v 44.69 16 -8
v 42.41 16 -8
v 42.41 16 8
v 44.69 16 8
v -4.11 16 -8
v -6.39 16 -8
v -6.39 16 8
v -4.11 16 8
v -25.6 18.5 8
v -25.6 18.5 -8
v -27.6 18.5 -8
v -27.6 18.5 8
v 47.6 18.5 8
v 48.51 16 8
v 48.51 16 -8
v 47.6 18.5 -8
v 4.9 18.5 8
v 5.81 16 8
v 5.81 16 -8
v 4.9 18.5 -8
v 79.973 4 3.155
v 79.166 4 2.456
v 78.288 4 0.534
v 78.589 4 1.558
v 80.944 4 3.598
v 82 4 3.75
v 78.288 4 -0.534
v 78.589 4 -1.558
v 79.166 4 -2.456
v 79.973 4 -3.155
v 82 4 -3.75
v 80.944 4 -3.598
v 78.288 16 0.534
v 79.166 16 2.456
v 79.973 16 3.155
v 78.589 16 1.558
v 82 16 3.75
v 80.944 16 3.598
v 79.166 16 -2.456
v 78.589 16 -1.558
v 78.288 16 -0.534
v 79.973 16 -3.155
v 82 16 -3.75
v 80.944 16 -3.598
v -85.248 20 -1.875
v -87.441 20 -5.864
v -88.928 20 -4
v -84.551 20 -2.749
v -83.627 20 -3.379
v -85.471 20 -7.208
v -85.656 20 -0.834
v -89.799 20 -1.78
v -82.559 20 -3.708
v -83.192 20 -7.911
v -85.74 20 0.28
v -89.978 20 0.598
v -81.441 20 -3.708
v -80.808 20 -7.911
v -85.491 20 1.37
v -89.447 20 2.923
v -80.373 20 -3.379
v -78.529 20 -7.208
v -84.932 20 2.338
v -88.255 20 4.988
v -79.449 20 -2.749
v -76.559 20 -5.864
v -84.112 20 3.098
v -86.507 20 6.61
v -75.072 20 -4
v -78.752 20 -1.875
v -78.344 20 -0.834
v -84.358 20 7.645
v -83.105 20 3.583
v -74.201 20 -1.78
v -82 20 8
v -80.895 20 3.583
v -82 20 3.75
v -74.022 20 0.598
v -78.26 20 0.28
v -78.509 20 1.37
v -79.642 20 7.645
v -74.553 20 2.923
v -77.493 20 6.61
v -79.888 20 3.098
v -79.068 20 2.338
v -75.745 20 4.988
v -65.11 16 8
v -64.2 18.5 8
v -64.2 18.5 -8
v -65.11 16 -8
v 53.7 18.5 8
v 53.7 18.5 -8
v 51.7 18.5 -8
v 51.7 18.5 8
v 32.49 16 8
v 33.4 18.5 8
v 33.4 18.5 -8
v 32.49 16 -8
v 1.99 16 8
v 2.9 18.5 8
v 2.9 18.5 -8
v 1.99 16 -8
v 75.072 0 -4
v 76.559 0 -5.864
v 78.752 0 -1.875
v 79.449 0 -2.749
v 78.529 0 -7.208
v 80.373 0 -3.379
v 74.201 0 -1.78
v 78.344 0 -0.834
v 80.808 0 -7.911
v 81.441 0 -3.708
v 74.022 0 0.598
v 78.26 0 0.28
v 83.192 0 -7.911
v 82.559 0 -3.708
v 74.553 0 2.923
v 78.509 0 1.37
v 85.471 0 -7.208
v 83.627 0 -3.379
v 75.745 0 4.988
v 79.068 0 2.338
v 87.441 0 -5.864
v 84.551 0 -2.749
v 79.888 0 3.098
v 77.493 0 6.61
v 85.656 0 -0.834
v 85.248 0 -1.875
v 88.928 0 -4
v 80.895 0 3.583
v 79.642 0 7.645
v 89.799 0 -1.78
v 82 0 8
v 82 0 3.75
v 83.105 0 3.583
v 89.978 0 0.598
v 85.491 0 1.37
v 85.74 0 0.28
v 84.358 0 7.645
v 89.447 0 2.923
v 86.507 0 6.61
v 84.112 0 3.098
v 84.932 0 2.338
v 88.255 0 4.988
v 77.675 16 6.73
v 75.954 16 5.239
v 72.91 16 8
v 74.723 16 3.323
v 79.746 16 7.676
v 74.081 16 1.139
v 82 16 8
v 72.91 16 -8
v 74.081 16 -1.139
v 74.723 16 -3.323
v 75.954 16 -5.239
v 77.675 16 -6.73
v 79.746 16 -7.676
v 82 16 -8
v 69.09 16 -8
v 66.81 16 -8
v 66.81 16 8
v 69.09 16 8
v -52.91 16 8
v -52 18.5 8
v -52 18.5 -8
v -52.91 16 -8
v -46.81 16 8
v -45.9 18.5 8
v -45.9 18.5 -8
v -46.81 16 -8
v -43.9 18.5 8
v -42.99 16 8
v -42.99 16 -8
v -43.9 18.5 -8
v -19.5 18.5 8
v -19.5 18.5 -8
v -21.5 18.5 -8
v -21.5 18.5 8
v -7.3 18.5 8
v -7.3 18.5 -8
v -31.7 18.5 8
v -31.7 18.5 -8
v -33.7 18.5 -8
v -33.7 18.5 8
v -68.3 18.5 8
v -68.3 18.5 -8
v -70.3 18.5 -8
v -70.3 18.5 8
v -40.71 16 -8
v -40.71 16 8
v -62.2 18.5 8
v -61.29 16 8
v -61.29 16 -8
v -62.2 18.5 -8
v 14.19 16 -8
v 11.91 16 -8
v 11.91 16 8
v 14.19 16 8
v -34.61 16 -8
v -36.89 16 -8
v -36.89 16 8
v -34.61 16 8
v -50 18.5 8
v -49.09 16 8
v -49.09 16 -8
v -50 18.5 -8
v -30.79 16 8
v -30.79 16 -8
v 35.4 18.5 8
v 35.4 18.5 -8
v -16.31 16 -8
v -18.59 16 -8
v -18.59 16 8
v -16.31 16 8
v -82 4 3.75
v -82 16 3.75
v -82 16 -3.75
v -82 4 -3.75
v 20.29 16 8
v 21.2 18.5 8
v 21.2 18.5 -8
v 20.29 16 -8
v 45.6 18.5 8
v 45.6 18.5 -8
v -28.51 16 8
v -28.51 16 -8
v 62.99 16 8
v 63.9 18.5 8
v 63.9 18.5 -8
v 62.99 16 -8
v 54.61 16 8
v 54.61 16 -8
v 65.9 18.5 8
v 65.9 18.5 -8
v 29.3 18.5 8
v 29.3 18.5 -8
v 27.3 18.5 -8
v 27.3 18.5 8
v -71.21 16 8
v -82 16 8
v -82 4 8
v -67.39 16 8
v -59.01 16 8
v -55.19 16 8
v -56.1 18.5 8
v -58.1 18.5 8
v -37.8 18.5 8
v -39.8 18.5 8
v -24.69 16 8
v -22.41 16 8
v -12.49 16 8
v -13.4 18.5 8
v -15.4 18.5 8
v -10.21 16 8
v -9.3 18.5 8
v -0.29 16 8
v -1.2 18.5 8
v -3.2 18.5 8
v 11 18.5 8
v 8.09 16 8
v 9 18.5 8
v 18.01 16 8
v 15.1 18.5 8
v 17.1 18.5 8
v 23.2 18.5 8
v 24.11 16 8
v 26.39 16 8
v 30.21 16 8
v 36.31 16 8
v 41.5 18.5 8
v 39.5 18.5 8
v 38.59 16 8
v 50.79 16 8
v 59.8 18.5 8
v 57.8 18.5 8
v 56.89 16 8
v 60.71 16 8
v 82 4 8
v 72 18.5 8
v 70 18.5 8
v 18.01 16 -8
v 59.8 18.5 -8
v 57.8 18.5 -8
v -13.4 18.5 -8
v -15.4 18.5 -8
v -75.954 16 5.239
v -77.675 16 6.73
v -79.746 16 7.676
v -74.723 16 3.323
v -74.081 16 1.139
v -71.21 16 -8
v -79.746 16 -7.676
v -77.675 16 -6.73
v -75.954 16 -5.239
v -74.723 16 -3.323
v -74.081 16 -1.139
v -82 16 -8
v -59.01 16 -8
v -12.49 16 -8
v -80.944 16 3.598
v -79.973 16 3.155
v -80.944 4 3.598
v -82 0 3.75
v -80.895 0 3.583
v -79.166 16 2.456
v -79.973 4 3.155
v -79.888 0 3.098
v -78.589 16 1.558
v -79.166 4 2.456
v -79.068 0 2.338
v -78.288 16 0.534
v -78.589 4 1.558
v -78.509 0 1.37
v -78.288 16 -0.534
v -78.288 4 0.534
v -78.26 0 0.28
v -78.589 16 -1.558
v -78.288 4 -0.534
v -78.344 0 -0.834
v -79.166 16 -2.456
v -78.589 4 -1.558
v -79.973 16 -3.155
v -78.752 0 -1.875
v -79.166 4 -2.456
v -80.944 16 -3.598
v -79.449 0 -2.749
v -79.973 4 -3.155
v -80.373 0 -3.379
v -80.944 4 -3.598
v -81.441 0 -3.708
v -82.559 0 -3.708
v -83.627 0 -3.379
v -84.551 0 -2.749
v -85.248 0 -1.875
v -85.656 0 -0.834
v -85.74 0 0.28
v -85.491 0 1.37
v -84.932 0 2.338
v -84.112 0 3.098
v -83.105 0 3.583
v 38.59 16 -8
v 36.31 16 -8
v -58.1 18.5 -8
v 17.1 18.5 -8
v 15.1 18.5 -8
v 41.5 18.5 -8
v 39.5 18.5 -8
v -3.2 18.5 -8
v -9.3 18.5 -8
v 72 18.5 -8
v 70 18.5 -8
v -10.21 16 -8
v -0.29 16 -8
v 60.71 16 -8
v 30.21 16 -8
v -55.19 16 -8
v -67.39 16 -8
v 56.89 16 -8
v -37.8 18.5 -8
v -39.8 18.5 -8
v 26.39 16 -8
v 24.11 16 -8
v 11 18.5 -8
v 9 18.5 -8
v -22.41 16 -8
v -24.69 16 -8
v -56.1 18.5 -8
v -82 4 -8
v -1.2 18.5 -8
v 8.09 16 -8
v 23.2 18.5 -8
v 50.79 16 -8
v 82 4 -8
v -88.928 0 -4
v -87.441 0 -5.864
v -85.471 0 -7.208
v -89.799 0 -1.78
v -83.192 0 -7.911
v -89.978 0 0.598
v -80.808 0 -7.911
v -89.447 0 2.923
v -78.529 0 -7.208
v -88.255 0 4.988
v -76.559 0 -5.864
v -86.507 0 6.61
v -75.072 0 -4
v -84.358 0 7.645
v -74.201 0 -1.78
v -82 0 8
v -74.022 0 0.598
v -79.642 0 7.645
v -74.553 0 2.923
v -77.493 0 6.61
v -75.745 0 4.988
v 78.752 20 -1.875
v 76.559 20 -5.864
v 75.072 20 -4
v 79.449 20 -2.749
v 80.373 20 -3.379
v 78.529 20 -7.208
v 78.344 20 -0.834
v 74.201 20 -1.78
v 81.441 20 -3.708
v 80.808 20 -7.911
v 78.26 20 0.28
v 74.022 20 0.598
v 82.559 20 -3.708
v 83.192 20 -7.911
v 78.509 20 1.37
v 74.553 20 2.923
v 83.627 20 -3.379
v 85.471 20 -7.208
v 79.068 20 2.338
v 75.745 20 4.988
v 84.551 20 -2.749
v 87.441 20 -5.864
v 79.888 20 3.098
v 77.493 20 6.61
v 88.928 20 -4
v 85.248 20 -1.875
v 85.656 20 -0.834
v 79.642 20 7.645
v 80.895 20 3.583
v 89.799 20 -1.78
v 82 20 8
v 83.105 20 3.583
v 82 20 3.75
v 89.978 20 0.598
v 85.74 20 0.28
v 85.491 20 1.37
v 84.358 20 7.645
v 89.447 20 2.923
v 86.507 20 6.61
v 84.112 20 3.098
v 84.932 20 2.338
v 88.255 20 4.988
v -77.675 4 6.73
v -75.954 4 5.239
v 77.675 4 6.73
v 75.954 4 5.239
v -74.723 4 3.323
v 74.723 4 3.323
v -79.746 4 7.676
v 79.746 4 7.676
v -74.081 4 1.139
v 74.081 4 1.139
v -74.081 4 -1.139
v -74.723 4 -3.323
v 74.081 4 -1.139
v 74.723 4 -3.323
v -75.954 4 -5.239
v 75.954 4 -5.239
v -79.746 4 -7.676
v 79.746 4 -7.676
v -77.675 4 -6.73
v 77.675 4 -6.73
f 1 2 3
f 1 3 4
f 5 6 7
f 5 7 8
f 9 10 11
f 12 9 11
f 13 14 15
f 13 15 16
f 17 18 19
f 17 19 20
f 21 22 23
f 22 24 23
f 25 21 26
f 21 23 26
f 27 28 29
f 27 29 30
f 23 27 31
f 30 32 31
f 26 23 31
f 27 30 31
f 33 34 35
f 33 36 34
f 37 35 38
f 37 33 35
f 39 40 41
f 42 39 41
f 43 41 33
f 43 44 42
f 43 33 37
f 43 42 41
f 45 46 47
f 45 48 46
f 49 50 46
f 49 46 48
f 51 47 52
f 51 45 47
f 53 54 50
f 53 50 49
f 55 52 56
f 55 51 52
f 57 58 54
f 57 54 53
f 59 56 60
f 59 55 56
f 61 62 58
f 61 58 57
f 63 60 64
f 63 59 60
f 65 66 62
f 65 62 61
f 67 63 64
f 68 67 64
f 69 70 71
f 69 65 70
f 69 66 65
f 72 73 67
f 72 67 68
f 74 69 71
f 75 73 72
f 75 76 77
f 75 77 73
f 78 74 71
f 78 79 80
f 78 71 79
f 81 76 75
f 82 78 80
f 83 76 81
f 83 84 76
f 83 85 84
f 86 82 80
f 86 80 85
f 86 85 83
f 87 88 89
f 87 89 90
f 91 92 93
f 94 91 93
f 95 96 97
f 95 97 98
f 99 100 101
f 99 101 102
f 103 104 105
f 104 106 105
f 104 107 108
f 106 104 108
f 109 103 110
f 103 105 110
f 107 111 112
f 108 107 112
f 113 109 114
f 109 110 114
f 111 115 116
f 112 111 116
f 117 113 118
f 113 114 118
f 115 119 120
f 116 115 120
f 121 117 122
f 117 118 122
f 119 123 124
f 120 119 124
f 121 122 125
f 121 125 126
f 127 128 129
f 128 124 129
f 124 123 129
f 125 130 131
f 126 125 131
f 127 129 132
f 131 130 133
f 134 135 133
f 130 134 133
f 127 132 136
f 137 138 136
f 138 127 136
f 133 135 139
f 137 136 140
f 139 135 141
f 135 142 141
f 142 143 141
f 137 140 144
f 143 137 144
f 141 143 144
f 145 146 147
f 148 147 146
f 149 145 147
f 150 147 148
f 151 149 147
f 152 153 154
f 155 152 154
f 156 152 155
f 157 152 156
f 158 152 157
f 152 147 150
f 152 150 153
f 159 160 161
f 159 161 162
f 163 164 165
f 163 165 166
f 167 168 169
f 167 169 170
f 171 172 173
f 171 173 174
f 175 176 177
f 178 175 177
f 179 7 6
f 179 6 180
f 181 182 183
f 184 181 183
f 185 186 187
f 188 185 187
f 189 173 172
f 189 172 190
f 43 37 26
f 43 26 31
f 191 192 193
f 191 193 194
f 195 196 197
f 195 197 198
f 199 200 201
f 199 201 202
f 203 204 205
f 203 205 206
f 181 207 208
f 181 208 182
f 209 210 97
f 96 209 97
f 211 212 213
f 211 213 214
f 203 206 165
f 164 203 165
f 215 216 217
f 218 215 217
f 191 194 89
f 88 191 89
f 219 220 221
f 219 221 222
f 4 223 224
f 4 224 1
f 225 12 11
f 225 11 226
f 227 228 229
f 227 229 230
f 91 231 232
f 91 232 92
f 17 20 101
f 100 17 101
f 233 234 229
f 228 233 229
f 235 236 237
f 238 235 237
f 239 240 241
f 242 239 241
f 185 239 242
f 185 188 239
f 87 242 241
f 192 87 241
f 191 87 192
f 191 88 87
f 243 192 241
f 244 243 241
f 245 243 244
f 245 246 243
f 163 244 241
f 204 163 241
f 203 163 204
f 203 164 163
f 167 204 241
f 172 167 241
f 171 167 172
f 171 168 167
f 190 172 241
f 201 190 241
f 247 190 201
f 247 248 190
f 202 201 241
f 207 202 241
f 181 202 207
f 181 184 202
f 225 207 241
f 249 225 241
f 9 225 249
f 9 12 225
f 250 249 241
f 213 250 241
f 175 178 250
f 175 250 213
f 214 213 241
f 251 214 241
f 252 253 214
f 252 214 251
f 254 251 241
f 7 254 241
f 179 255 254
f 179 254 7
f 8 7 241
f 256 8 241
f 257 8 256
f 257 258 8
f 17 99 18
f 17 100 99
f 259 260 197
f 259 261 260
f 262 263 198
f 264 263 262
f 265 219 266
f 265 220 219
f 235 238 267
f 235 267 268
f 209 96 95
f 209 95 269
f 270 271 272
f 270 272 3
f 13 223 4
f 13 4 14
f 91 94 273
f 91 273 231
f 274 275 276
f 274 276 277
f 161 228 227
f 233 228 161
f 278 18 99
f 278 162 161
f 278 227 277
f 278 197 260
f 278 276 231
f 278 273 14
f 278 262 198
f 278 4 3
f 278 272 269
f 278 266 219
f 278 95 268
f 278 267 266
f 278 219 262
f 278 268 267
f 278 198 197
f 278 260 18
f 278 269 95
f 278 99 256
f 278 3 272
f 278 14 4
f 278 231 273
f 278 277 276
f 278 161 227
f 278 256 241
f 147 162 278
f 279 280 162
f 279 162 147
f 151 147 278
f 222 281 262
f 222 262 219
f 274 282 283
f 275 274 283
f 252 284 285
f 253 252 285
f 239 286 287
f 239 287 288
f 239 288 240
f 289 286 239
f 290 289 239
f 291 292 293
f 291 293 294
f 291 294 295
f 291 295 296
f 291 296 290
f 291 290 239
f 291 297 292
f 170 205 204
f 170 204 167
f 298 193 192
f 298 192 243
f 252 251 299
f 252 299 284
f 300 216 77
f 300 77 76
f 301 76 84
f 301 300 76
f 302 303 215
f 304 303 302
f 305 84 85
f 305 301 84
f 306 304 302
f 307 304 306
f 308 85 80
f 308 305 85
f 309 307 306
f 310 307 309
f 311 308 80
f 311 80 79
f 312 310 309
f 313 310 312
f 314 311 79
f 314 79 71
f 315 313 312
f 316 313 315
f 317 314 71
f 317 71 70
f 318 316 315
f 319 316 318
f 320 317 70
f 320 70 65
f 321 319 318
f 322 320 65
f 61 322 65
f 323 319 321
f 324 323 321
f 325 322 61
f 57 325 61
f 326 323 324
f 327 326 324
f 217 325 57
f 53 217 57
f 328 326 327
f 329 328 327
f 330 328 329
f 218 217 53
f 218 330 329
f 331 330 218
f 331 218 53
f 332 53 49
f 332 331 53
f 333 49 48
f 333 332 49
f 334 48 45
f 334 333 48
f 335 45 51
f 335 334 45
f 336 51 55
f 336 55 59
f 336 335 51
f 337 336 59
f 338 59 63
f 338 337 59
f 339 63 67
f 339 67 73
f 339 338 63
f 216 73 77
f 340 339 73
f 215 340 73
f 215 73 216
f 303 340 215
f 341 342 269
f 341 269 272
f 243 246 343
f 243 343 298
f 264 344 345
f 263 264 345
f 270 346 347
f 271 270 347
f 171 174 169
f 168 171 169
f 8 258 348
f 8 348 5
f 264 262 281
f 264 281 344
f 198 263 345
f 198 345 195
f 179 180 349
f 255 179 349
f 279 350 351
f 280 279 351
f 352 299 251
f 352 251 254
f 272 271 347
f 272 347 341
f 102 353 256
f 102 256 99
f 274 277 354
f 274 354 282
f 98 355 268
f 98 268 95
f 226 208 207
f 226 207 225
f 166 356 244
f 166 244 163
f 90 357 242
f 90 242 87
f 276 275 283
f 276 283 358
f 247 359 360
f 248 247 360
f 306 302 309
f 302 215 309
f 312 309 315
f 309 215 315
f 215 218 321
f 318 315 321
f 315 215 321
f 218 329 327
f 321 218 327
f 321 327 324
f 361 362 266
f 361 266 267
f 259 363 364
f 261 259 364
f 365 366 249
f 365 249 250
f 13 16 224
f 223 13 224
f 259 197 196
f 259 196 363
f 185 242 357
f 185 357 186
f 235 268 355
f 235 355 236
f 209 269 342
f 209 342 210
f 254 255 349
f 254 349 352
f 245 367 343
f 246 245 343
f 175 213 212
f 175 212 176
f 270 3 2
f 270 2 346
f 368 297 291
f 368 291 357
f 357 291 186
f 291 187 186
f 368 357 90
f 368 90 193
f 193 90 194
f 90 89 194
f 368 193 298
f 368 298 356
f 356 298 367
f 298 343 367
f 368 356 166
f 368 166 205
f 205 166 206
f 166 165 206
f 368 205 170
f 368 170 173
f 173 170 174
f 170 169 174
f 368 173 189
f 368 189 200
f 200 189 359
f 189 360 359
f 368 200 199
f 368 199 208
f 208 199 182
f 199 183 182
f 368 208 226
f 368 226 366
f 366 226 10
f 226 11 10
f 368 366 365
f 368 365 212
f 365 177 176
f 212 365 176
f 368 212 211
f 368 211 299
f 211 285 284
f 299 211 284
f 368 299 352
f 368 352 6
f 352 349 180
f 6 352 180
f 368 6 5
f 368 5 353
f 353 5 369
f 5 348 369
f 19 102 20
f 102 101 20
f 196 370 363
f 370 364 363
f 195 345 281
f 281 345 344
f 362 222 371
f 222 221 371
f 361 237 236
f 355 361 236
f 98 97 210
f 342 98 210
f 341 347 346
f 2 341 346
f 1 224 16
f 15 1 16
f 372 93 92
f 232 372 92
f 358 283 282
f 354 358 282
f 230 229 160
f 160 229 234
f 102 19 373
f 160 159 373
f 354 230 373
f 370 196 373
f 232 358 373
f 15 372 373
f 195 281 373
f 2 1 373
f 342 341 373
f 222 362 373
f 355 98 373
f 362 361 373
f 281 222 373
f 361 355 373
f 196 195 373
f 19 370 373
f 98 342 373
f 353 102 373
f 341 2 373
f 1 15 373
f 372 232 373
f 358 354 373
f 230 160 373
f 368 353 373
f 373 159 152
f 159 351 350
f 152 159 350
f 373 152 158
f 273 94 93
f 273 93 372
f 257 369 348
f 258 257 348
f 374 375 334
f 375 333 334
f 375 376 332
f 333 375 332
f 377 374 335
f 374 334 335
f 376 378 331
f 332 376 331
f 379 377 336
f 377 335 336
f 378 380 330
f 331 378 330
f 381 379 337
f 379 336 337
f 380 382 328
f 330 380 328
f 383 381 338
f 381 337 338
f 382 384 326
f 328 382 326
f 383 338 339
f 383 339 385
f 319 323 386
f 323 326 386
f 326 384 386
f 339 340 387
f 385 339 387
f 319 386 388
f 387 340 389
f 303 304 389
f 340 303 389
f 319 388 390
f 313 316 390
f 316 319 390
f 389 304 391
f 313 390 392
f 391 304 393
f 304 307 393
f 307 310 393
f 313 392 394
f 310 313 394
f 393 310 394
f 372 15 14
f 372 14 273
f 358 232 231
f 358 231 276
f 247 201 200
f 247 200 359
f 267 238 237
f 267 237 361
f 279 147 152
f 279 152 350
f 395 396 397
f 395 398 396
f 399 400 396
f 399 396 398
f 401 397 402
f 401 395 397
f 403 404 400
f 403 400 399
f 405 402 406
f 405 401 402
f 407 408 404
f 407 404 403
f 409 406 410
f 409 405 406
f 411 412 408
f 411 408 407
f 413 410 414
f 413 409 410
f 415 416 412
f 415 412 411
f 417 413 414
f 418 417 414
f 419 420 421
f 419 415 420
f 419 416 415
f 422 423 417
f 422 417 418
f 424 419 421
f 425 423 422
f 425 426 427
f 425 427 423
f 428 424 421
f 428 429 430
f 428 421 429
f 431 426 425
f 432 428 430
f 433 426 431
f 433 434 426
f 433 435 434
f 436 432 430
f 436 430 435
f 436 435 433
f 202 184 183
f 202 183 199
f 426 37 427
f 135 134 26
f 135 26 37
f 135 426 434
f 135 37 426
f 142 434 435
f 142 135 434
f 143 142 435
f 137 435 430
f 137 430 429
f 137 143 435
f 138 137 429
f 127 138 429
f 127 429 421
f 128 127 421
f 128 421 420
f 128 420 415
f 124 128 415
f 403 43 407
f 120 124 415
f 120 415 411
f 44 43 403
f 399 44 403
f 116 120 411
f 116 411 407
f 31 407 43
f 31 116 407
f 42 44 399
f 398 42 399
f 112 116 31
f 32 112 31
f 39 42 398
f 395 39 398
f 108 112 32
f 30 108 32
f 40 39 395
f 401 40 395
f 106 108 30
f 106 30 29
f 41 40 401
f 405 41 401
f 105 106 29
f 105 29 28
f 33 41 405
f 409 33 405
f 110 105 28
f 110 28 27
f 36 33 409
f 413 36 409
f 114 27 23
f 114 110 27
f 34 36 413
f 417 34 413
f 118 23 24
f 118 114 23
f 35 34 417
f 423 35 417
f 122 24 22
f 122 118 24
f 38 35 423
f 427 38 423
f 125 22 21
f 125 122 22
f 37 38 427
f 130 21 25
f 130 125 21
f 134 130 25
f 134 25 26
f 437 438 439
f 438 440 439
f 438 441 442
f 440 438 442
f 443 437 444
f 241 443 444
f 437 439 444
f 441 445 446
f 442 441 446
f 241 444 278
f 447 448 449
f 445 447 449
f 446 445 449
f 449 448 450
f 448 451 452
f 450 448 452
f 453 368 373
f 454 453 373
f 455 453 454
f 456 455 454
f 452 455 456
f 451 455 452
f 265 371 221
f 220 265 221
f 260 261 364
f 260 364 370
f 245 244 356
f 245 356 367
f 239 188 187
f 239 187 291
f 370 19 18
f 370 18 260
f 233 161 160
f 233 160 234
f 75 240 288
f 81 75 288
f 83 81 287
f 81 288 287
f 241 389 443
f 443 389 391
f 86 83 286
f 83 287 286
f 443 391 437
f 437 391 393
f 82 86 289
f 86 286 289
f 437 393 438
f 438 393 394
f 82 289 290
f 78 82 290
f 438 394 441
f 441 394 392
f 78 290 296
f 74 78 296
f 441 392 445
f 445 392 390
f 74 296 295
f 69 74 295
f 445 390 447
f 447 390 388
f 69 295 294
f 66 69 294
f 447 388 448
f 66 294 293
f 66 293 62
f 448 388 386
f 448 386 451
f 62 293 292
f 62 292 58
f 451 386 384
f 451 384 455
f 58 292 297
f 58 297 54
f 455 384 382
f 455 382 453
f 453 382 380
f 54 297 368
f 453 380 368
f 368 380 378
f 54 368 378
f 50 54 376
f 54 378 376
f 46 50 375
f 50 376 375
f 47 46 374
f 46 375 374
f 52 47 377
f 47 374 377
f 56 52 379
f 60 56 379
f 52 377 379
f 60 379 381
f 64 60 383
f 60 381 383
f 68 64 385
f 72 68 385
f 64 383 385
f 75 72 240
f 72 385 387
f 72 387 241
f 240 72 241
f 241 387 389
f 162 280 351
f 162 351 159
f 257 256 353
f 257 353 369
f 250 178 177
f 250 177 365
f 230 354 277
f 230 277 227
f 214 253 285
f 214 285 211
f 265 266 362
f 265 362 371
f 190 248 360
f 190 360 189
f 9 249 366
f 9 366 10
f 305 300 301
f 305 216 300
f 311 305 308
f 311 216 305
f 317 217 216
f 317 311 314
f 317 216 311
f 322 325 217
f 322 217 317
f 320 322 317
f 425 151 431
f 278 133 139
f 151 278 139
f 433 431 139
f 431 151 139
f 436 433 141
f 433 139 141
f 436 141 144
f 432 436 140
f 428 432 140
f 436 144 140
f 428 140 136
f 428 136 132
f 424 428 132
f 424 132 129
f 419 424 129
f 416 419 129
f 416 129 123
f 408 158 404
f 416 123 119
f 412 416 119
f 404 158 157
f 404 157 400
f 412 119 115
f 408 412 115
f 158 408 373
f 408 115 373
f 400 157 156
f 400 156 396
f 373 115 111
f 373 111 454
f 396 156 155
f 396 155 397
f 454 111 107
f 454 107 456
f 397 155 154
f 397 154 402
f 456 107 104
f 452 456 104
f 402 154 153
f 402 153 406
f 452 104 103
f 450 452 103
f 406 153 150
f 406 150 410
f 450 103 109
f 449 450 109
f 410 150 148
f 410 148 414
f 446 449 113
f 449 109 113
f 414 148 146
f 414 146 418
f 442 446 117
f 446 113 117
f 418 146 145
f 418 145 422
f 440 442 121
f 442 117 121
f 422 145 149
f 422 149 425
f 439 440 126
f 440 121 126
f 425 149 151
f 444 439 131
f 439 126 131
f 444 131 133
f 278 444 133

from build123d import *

# Parameters (mm, degrees)
SKETCH2_R             = 8
SKETCH2_R_2           = 3.75
BOSS_EXTRUDE1_DEPTH   = 20
BOSS_EXTRUDE1_2_DEPTH = 20
SKETCH4_W             = 164
SKETCH4_H             = 16
BOSS_EXTRUDE2_DEPTH   = 12
BOSS_EXTRUDE3_DEPTH   = 16
LPATTERN2_COUNT       = 24
LPATTERN2_PITCH       = 6.1


with BuildPart() as part:
    # Sketch2 → Boss-Extrude1 (new body)
    with BuildSketch(Plane(origin=(0, 0, 0), x_dir=(1, 0, 0), z_dir=(0, 1, 0))):
        with Locations(Location((-82, 0, 0), (0, 0, 270))):
            Circle(SKETCH2_R)
        with Locations(Location((-82, 0, 0), (0, 0, 270))):
            Circle(SKETCH2_R_2, mode=Mode.SUBTRACT)
    extrude(amount=BOSS_EXTRUDE1_DEPTH)



with BuildPart() as body_2:
    # Sketch2 → Boss-Extrude1 2 (new body)
    with BuildSketch(Plane(origin=(0, 0, 0), x_dir=(1, 0, 0), z_dir=(0, 1, 0))):
        with Locations(Location((82, 0, 0), (0, 0, 270))):
            Circle(SKETCH2_R)
        with Locations(Location((82, 0, 0), (0, 0, 270))):
            Circle(SKETCH2_R_2, mode=Mode.SUBTRACT)
    extrude(amount=BOSS_EXTRUDE1_2_DEPTH)


with BuildPart() as part_1:
    add(part.part)

    add(body_2.part)  # Boss-Extrude2 merges body 2
    # Sketch4 → Boss-Extrude2 (add)
    with BuildSketch(Plane(origin=(0, 16, 0), x_dir=(1, 0, 0), z_dir=(0, 1, 0))):
        Rectangle(SKETCH4_W, SKETCH4_H)
    extrude(amount=-BOSS_EXTRUDE2_DEPTH)

    # Sketch5 → Boss-Extrude3 (add, through all)
    with BuildSketch(Plane.XY.offset(8)):
        Polygon((72.909925586, 16), (72, 18.5), (70, 18.5), (69.090074414, 16), align=None)
    boss_extrude3 = extrude(amount=-BOSS_EXTRUDE3_DEPTH)

    # LPattern2: Boss-Extrude3 ×24
    with Locations(*[(-i * LPATTERN2_PITCH, 0, 0) for i in range(1, LPATTERN2_COUNT)]):
        add(boss_extrude3)


solid = part_1.part
